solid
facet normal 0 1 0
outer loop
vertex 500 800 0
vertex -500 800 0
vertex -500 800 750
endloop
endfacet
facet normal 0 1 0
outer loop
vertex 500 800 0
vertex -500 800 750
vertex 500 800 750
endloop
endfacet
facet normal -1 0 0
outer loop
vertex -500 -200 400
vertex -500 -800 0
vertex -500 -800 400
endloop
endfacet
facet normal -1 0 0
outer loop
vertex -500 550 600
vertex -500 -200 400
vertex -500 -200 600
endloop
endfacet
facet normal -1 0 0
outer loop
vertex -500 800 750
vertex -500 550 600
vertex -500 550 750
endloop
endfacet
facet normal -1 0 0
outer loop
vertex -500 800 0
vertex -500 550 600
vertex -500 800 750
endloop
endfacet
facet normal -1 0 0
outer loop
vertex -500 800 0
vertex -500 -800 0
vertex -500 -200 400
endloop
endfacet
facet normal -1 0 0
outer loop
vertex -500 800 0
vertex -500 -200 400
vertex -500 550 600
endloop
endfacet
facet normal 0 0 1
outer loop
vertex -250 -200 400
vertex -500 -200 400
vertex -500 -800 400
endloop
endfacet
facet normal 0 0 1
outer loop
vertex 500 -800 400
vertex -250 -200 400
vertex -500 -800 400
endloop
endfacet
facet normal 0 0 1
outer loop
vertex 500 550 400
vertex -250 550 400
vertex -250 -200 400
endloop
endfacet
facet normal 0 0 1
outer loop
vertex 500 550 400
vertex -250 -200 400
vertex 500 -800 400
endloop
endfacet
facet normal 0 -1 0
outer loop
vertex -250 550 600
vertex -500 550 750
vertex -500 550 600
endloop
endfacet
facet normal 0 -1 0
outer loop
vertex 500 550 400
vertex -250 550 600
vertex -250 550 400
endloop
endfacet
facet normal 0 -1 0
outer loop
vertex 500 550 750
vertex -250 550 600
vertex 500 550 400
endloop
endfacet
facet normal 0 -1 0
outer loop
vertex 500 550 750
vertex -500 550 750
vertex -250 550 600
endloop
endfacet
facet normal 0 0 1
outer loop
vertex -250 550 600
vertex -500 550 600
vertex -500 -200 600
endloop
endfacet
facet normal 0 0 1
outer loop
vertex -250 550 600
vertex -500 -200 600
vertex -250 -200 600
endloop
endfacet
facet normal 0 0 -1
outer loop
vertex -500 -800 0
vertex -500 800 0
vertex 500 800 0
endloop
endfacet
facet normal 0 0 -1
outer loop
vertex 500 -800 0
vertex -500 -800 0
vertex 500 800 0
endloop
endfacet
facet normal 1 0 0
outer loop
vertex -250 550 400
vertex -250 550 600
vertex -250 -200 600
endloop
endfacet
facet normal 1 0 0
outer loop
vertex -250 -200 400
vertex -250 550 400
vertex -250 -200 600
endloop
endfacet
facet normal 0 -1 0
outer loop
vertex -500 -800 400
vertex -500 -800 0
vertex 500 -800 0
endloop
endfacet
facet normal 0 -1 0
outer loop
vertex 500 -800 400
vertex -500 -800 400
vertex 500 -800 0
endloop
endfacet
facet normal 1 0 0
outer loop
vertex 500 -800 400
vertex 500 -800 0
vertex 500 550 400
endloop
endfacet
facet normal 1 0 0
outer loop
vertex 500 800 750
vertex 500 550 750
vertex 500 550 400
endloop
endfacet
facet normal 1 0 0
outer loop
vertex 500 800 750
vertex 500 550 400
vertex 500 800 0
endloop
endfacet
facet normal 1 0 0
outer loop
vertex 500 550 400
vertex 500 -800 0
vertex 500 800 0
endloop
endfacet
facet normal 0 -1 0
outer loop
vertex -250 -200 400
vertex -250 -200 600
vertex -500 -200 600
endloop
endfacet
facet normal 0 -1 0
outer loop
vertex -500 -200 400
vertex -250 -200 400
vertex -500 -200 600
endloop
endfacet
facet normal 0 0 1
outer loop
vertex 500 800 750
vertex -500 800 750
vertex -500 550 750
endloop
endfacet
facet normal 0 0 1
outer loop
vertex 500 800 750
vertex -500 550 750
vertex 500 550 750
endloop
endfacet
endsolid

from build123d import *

# Parameters (mm, degrees)
F0_W     = 1000
F0_H     = 1600
F1_DEPTH = 750
F3_DEPTH = 350
F4_W     = 250
F4_H     = 750
F5_DEPTH = 150


with BuildPart() as f1:
    # F0 (on Top) → F1 (new body)
    with BuildSketch(Plane.XY):
        Rectangle(F0_W, F0_H)
    extrude(amount=F1_DEPTH)

    # F2 (on face) → F3 (cut)
    with BuildSketch(Plane.XY.offset(750)):
        Polygon((-250, -200), (-500, -200), (-500, -800), (500, -800), (500, 550), (-250, 550), align=None)
    extrude(amount=-F3_DEPTH, mode=Mode.SUBTRACT)

    # F4 (on face) → F5 (cut)
    with BuildSketch(Plane.XY.offset(750)):
        with Locations((-375, 175)):
            Rectangle(F4_W, F4_H)
    extrude(amount=-F5_DEPTH, mode=Mode.SUBTRACT)


solid = f1.part
